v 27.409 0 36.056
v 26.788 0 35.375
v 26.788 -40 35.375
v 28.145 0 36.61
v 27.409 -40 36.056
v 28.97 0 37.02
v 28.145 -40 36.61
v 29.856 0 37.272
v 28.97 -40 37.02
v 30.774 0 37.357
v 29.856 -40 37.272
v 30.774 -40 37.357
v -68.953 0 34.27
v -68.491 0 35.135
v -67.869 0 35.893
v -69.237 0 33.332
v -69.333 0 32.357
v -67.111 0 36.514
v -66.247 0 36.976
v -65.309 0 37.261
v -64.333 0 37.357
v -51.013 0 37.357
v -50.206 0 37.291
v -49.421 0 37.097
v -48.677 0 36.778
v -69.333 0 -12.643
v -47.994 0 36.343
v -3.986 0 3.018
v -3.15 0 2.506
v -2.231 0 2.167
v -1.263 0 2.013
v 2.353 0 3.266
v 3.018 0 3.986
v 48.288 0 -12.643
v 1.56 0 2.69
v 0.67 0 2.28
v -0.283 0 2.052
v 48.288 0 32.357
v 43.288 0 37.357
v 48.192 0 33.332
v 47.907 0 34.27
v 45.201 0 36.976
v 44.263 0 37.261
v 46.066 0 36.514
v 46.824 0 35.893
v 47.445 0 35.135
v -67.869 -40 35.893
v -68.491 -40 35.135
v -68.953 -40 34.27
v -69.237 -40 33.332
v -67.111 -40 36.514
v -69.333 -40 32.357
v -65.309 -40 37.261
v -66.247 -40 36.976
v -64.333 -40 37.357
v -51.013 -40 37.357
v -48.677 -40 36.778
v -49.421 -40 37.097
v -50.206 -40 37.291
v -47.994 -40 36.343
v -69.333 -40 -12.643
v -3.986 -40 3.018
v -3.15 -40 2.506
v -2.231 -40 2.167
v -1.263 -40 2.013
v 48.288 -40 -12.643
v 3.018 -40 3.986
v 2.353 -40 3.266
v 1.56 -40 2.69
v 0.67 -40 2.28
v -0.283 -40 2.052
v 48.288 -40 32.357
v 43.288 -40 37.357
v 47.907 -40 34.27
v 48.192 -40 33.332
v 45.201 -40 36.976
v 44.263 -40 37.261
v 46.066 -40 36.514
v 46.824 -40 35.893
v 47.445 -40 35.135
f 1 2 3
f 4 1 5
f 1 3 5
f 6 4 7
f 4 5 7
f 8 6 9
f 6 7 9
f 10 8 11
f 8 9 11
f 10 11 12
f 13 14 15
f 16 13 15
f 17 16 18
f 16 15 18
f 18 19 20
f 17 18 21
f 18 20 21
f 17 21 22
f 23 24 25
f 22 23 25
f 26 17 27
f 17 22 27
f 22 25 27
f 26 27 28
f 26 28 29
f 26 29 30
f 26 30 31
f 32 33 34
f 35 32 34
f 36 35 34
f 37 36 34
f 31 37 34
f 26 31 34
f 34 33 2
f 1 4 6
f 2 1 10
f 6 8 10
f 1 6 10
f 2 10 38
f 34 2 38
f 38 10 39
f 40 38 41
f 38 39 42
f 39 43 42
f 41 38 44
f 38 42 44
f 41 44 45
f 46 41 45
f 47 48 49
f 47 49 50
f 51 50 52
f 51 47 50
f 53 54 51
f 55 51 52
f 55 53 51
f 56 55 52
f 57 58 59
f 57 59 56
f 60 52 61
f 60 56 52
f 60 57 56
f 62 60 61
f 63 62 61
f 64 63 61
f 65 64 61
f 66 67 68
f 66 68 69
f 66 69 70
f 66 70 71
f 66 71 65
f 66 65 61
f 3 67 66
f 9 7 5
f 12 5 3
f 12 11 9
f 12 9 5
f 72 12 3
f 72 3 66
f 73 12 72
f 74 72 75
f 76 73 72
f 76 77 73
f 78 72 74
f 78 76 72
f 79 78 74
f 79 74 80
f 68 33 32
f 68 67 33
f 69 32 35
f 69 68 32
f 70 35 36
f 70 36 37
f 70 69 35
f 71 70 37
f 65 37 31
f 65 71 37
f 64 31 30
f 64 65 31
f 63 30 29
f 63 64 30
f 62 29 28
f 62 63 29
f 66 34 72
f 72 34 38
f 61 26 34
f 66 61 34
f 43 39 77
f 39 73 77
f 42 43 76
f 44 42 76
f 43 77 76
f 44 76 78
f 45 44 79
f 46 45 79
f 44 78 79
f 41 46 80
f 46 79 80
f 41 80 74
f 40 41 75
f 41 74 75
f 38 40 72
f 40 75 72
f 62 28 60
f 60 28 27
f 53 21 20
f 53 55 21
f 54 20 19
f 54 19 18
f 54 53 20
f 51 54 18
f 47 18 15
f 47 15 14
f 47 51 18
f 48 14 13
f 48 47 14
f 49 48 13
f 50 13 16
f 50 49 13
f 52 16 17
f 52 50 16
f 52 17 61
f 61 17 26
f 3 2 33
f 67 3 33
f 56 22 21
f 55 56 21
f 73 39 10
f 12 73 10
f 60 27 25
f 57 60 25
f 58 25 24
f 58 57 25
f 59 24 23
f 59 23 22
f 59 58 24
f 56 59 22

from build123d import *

# Parameters (mm, degrees)
F1_DEPTH = 40
F2_R     = 5
F3_R     = 5


with BuildPart() as f1:
    # F0 (on Front) → F1 (new body)
    with BuildSketch(Plane.XZ):
        Polygon((-49.333352, 37.356967), (-69.333352, 37.356967), (-69.333352, -12.643033), (48.288023, -12.643033), (48.288023, 37.356967), (28.288023, 37.356967), (0, 0), align=None)
    extrude(amount=F1_DEPTH)

    # F2
    f2_edges = [f1.edges().sort_by_distance(p)[0] for p in [
        (0, -20, 0),
    ]]
    fillet(f2_edges, radius=F2_R)

    # F3
    f3_edges = [f1.edges().sort_by_distance(p)[0] for p in [
        (-69.333352, -20, 37.356967),
        (48.288023, -20, 37.356967),
        (-49.333352, -20, 37.356967),
        (28.288023, -20, 37.356967),
    ]]
    fillet(f3_edges, radius=F3_R)


solid = f1.part
